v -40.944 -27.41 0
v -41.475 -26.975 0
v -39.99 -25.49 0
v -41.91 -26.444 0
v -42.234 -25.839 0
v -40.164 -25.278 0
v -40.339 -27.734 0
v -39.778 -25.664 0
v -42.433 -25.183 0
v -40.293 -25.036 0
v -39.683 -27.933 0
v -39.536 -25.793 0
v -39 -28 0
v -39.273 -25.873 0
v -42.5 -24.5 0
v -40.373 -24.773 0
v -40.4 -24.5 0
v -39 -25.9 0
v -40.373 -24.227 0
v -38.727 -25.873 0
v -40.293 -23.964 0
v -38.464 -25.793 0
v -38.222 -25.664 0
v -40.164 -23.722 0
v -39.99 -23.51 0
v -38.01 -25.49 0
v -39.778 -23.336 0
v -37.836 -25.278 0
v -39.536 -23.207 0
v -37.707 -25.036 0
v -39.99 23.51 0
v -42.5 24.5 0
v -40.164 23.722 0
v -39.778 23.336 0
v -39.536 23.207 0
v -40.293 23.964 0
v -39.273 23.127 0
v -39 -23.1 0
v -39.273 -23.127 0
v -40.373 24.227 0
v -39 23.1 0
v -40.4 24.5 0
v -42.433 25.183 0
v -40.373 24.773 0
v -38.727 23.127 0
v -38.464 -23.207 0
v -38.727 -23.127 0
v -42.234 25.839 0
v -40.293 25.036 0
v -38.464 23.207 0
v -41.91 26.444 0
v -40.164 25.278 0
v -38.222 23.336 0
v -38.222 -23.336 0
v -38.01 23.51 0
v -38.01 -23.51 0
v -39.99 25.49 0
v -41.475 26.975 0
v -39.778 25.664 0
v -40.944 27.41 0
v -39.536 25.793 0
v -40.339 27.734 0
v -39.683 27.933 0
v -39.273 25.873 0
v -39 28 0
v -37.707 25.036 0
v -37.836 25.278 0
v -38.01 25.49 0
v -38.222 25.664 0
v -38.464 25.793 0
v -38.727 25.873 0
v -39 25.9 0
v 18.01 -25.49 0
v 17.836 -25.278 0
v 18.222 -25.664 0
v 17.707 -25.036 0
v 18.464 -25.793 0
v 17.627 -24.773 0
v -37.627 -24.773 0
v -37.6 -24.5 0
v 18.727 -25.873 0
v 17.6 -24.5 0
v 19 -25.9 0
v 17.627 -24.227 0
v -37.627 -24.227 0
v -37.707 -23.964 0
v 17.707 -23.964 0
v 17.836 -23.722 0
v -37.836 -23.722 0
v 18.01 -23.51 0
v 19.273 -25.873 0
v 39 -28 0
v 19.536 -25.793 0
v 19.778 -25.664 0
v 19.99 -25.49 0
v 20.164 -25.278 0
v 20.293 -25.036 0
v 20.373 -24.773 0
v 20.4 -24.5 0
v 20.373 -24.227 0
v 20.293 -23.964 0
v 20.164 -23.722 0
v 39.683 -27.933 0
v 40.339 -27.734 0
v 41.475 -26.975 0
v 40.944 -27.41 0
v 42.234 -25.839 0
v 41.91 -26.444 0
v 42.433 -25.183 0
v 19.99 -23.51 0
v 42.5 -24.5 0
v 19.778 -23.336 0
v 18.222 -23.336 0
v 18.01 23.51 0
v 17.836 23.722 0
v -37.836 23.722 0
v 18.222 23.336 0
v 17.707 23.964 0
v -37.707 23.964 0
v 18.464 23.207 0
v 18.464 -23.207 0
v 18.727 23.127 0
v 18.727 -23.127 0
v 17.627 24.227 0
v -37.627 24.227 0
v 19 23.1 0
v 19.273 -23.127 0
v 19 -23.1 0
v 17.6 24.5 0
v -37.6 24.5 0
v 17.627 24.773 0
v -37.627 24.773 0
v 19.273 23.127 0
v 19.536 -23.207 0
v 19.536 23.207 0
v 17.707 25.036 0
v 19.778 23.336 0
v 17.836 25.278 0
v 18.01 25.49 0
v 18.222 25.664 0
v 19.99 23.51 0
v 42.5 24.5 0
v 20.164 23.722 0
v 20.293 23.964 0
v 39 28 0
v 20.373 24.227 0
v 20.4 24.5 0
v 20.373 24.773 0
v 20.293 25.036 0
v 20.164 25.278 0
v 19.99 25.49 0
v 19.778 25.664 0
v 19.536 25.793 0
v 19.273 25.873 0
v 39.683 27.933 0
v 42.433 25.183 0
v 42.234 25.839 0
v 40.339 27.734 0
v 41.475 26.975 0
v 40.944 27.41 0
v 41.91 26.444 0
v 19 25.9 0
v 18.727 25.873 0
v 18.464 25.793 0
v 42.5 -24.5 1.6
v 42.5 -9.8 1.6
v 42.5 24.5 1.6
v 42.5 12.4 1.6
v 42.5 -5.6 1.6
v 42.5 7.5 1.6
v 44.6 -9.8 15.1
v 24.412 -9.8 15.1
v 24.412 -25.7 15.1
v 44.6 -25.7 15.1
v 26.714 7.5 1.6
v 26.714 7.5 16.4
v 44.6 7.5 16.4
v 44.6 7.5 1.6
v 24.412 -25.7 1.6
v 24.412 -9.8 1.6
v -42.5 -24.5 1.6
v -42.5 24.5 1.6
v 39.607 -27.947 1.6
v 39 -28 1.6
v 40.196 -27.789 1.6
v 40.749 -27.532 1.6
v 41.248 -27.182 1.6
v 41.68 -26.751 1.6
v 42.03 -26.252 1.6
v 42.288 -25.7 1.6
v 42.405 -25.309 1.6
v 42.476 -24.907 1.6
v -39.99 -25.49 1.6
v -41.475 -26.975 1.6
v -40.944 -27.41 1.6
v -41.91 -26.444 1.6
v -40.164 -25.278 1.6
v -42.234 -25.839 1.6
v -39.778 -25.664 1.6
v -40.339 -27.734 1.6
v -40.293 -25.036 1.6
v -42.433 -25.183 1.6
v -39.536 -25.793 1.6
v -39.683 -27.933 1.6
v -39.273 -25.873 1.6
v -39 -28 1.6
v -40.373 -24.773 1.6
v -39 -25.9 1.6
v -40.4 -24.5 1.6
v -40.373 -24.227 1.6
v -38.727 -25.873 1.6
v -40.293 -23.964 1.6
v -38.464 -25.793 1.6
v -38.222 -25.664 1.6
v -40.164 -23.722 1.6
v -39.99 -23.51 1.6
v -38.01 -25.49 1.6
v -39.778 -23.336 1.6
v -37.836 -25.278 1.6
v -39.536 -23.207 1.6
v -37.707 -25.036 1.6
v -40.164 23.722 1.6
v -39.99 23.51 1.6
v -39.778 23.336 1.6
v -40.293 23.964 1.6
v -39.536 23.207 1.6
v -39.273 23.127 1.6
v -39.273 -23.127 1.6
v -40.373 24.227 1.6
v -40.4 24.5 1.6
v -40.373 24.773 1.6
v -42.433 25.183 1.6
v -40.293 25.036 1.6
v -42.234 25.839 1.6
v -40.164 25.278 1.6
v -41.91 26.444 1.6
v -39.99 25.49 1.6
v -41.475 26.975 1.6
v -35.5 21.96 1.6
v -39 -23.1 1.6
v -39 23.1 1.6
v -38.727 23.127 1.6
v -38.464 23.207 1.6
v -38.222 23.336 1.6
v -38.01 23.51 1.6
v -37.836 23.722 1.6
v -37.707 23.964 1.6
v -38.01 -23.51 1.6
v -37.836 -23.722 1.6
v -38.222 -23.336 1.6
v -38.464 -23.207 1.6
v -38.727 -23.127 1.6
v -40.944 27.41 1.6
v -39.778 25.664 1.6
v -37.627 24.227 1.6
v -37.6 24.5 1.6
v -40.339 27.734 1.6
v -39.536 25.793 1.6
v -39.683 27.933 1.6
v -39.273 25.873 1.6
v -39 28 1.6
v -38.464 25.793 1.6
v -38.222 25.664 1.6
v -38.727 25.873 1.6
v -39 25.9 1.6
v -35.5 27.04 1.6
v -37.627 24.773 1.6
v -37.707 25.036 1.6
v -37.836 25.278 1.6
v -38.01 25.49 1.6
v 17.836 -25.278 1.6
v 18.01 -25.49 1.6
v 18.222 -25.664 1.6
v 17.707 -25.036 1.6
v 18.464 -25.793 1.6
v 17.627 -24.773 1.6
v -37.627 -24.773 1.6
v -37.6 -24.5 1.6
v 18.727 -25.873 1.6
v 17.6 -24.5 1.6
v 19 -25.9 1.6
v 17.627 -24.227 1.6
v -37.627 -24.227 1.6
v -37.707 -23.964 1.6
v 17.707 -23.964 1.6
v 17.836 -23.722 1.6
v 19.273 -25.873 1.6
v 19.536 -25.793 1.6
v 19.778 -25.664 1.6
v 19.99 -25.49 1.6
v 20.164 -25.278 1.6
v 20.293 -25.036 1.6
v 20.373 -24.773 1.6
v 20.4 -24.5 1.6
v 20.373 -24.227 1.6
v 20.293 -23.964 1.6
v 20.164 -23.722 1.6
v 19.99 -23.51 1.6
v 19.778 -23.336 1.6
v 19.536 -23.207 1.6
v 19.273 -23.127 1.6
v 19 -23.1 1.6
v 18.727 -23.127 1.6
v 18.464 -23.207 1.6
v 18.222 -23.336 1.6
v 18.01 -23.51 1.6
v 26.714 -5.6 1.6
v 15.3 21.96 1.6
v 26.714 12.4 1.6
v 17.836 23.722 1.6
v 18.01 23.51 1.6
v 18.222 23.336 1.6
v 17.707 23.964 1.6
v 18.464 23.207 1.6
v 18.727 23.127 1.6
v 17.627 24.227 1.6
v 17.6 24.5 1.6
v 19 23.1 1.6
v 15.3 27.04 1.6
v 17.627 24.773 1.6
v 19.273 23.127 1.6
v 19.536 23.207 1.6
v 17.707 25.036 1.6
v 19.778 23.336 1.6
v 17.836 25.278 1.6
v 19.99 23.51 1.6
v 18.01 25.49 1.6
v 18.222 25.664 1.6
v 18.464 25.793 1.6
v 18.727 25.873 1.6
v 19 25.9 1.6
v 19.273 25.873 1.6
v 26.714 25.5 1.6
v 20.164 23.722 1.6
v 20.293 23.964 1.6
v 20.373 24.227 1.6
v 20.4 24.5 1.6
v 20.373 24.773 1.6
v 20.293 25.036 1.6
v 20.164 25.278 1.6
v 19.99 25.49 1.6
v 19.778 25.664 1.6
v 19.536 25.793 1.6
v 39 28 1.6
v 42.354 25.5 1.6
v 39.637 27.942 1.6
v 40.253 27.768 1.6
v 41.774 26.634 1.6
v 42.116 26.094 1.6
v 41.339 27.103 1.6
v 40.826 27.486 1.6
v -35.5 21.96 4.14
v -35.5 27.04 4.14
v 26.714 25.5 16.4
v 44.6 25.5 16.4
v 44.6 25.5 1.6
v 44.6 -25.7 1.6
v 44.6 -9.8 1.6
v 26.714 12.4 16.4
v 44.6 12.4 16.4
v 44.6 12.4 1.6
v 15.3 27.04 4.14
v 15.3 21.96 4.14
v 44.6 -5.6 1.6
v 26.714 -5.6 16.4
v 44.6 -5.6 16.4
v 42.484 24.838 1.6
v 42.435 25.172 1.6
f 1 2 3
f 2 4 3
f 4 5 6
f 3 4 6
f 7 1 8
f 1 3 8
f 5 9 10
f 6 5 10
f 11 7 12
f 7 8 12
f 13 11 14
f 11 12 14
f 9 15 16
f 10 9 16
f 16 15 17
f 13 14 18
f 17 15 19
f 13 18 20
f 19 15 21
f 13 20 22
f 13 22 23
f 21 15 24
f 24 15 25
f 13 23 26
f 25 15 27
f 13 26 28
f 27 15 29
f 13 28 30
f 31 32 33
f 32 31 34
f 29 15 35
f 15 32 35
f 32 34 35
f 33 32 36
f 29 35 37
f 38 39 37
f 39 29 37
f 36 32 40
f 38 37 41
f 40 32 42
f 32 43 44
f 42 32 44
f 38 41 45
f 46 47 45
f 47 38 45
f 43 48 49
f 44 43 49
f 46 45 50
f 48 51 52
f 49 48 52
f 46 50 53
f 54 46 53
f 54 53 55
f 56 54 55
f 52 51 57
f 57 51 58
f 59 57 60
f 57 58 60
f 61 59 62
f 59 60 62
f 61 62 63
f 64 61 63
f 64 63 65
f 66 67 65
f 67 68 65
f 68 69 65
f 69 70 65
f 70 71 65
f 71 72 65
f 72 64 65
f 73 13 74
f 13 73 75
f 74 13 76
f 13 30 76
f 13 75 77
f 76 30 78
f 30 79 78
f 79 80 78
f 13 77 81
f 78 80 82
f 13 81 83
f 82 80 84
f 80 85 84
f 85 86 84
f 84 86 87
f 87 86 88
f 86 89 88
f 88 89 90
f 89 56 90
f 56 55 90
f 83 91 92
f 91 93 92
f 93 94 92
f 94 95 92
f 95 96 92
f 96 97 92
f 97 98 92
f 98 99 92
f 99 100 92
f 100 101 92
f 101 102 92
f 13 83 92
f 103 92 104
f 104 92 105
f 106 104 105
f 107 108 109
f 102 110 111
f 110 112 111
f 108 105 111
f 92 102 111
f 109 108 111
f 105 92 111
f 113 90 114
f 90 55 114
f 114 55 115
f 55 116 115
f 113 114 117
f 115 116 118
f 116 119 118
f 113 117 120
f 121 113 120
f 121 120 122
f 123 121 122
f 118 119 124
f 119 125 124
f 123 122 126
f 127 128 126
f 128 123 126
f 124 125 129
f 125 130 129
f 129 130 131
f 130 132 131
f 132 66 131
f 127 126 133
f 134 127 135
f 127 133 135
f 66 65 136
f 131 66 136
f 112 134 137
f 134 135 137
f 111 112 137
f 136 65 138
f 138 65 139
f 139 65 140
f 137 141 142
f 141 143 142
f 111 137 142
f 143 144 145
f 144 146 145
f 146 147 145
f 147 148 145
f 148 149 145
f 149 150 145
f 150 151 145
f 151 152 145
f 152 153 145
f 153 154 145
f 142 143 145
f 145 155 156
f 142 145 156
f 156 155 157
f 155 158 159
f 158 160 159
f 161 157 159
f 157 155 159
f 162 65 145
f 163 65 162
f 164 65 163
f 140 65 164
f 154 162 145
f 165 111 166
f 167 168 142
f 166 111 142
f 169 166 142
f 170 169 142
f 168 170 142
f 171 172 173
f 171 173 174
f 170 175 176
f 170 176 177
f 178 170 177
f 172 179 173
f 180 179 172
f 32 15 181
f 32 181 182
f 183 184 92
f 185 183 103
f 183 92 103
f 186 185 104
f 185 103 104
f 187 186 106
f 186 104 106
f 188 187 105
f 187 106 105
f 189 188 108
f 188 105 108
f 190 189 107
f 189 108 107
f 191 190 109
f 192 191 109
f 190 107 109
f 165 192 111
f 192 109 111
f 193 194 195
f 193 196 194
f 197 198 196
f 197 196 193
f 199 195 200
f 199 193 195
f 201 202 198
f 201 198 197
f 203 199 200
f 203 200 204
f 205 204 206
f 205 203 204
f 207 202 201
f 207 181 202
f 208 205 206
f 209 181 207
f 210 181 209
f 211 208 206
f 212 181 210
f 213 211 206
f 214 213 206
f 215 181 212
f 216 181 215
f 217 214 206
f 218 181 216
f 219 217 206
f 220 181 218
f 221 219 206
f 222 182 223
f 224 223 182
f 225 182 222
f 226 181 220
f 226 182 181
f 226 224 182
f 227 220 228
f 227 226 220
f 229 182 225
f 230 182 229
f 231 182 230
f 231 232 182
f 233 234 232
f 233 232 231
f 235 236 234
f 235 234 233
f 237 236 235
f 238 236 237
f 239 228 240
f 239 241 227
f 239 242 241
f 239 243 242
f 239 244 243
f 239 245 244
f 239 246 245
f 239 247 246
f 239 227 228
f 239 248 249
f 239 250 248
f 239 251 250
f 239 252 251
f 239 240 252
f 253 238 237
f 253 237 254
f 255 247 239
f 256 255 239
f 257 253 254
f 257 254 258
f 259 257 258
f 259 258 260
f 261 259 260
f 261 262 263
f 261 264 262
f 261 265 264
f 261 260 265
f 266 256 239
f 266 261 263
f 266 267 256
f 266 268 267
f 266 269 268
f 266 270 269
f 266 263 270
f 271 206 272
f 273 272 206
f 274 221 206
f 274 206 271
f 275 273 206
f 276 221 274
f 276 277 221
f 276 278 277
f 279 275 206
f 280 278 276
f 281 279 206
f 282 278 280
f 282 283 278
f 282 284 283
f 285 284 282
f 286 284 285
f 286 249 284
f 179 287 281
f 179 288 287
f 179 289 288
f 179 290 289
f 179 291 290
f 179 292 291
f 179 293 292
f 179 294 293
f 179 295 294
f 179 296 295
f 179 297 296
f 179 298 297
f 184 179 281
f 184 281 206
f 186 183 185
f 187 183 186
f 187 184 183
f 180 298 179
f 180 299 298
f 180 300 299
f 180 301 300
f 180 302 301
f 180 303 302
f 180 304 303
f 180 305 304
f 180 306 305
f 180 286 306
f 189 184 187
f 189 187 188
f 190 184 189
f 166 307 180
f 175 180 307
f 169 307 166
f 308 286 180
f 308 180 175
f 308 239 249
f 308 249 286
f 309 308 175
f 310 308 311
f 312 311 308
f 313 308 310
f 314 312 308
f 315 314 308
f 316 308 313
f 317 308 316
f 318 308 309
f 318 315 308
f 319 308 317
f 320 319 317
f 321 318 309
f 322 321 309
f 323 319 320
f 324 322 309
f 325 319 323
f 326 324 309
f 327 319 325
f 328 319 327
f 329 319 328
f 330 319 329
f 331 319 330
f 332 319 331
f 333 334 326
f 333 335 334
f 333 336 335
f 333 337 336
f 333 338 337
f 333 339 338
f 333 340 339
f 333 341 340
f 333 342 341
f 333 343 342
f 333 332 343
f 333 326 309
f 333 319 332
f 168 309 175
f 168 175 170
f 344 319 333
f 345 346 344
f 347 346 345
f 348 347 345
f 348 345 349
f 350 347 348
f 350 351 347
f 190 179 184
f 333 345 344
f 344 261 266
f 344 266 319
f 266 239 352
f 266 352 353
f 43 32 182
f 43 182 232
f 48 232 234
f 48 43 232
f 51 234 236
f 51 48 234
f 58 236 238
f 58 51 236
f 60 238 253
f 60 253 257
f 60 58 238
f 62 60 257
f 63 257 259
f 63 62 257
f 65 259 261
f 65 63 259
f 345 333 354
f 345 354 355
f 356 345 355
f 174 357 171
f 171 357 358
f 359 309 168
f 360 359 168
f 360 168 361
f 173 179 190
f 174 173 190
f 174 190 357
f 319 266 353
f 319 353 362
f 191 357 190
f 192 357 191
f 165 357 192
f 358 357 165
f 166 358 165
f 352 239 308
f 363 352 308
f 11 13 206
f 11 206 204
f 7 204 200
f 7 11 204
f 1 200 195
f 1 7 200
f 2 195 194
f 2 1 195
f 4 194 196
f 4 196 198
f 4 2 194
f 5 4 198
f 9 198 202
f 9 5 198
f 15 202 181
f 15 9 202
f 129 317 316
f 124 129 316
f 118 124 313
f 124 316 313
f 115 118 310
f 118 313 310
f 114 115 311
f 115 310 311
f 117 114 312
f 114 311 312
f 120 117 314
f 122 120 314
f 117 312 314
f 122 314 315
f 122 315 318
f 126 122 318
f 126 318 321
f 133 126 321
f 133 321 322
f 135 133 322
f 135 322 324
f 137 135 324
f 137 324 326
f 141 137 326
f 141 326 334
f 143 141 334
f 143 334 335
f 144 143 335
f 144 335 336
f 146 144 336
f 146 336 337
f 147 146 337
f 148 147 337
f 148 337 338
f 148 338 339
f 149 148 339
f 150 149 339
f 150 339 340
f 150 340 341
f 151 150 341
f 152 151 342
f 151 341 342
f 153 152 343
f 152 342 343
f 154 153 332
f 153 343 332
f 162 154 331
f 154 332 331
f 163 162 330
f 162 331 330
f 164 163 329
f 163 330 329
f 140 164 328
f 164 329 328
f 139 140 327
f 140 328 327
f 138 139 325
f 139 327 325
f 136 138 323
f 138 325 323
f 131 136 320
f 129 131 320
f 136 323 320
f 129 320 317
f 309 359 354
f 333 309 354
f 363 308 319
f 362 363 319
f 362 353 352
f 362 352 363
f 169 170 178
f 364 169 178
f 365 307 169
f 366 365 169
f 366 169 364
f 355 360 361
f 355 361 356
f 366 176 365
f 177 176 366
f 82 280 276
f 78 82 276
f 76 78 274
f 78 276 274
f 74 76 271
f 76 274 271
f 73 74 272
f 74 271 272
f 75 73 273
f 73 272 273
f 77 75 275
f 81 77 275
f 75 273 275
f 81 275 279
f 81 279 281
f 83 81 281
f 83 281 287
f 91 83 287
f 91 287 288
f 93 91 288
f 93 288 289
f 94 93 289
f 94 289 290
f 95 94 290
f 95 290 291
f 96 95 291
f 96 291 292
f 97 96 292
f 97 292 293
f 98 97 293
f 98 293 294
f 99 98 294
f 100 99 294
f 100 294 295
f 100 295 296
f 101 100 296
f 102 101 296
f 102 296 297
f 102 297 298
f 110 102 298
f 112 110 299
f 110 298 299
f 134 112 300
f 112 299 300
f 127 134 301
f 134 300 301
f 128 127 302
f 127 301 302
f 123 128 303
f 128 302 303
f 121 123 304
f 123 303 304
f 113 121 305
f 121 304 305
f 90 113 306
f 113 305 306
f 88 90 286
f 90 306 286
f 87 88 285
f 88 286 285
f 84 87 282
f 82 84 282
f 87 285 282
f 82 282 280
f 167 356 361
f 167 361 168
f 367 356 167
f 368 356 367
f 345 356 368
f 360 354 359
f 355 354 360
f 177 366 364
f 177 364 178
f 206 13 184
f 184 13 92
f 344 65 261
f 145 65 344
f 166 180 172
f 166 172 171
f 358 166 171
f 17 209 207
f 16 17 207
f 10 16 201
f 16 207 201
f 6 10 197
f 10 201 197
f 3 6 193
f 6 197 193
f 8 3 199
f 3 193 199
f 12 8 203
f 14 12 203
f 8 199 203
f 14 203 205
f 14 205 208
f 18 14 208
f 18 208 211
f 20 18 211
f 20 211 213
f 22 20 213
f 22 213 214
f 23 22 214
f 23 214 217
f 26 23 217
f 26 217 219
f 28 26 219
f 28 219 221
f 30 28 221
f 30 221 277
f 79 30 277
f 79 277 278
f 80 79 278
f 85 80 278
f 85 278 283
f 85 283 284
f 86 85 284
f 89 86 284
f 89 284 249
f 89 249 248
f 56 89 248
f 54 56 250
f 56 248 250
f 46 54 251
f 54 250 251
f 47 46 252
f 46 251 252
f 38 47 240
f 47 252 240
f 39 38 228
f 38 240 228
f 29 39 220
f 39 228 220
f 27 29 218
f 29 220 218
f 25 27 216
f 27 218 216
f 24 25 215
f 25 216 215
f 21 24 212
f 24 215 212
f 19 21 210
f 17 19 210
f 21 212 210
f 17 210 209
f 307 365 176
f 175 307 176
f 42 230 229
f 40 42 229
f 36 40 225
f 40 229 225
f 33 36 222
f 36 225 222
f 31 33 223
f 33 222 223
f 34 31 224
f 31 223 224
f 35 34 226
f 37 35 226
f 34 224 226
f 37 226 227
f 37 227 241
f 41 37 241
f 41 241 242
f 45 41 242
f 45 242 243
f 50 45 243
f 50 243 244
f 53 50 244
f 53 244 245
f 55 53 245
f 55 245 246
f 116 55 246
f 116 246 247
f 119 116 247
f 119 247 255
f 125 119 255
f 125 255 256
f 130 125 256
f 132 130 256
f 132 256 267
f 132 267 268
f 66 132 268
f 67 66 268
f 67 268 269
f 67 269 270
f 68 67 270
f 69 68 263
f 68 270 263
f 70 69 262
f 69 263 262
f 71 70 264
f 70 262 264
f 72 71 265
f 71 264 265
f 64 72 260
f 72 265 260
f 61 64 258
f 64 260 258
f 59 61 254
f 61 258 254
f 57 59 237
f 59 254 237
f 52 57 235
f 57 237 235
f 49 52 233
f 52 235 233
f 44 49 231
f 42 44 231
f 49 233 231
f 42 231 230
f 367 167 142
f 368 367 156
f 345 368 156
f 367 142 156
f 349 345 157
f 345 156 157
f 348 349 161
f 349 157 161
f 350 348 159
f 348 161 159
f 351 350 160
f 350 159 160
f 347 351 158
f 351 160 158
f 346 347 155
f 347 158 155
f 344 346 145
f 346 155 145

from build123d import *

# Parameters (mm, degrees)
F0_W        = 85
F0_H        = 56
F1_DEPTH    = 1.6
F2_D        = 2.8
F3_W        = 50.8
F3_H        = 5.08
F4_DEPTH    = 2.54
F5_W        = 17.8862189412
F5_H        = 13.1
F6_DEPTH    = 14.8
F7_W        = 20.1875766277
F7_H        = 15.9
F8_DEPTH    = 13.5
F9_T1_DEPTH = 19.1
F9_T3_DEPTH = 10.35


# Not quite as in the source:
# - a fillet or chamfer that OpenCascade refuses, or shapes differently, is made with other operations: its cross-section is extruded or revolved along the edge and cut away or added


with BuildPart() as f1:
    # F0 (on Top) → F1 (new body)
    with BuildSketch(Plane.XY):
        Rectangle(F0_W, F0_H)
    extrude(amount=F1_DEPTH)

    # F2 (through all)
    with Locations(Plane(origin=(0, 0, 0), x_dir=(1, 0, 0), z_dir=(0, 0, -1))):
        with Locations((-39, -24.5), (19, -24.5), (19, 24.5), (-39, 24.5)):
            Hole(F2_D / 2)

    # F3 (on face) → F4 (join)
    with BuildSketch(Plane.XY.offset(1.6)):
        with Locations((-10.1, 24.5)):
            Rectangle(F3_W, F3_H)
    extrude(amount=F4_DEPTH)

    # F5 (on face) → F6 (join)
    with BuildSketch(Plane.XY.offset(1.6)):
        with Locations((35.6568905294, 18.95)):
            Rectangle(F5_W, F5_H)
        with Locations((35.6568905294, 0.95)):
            Rectangle(F5_W, F5_H)
    extrude(amount=F6_DEPTH)

    # F7 (on face) → F8 (join)
    with BuildSketch(Plane.XY.offset(1.6)):
        with Locations((34.5062116861, -17.75)):
            Rectangle(F7_W, F7_H)
    extrude(amount=F8_DEPTH)

    # F9: fillet of radius 3.5 on 4 edges, made by hand

    # F9_s2 → F9_t1 (cut)
    with BuildSketch(Plane.XY.offset(-8.75)):
        with BuildLine():
            ThreePointArc((-39, -28), (-41.4748737342, -26.9748737342), (-42.5, -24.5))
            Line((-42.5, -24.5), (-42.5, -28))
            Line((-42.5, -28), (-39, -28))
        make_face()
        with BuildLine():
            ThreePointArc((-42.5, 24.5), (-41.4748737342, 26.9748737342), (-39, 28))
            Line((-39, 28), (-42.5, 28))
            Line((-42.5, 28), (-42.5, 24.5))
        make_face()
    extrude(amount=F9_T1_DEPTH, mode=Mode.SUBTRACT)

    # F9_s4 → F9_t3 (cut)
    with BuildSketch(Plane.XY.offset(-8.75)):
        with BuildLine():
            ThreePointArc((39, -28), (41.4748737342, -26.9748737342), (42.5, -24.5))
            Line((42.5, -24.5), (42.5, -28))
            Line((42.5, -28), (39, -28))
        make_face()
        with BuildLine():
            ThreePointArc((42.5, 24.5), (41.4748737342, 26.9748737342), (39, 28))
            Line((39, 28), (42.5, 28))
            Line((42.5, 28), (42.5, 24.5))
        make_face()
    extrude(amount=F9_T3_DEPTH, mode=Mode.SUBTRACT)


solid = f1.part
